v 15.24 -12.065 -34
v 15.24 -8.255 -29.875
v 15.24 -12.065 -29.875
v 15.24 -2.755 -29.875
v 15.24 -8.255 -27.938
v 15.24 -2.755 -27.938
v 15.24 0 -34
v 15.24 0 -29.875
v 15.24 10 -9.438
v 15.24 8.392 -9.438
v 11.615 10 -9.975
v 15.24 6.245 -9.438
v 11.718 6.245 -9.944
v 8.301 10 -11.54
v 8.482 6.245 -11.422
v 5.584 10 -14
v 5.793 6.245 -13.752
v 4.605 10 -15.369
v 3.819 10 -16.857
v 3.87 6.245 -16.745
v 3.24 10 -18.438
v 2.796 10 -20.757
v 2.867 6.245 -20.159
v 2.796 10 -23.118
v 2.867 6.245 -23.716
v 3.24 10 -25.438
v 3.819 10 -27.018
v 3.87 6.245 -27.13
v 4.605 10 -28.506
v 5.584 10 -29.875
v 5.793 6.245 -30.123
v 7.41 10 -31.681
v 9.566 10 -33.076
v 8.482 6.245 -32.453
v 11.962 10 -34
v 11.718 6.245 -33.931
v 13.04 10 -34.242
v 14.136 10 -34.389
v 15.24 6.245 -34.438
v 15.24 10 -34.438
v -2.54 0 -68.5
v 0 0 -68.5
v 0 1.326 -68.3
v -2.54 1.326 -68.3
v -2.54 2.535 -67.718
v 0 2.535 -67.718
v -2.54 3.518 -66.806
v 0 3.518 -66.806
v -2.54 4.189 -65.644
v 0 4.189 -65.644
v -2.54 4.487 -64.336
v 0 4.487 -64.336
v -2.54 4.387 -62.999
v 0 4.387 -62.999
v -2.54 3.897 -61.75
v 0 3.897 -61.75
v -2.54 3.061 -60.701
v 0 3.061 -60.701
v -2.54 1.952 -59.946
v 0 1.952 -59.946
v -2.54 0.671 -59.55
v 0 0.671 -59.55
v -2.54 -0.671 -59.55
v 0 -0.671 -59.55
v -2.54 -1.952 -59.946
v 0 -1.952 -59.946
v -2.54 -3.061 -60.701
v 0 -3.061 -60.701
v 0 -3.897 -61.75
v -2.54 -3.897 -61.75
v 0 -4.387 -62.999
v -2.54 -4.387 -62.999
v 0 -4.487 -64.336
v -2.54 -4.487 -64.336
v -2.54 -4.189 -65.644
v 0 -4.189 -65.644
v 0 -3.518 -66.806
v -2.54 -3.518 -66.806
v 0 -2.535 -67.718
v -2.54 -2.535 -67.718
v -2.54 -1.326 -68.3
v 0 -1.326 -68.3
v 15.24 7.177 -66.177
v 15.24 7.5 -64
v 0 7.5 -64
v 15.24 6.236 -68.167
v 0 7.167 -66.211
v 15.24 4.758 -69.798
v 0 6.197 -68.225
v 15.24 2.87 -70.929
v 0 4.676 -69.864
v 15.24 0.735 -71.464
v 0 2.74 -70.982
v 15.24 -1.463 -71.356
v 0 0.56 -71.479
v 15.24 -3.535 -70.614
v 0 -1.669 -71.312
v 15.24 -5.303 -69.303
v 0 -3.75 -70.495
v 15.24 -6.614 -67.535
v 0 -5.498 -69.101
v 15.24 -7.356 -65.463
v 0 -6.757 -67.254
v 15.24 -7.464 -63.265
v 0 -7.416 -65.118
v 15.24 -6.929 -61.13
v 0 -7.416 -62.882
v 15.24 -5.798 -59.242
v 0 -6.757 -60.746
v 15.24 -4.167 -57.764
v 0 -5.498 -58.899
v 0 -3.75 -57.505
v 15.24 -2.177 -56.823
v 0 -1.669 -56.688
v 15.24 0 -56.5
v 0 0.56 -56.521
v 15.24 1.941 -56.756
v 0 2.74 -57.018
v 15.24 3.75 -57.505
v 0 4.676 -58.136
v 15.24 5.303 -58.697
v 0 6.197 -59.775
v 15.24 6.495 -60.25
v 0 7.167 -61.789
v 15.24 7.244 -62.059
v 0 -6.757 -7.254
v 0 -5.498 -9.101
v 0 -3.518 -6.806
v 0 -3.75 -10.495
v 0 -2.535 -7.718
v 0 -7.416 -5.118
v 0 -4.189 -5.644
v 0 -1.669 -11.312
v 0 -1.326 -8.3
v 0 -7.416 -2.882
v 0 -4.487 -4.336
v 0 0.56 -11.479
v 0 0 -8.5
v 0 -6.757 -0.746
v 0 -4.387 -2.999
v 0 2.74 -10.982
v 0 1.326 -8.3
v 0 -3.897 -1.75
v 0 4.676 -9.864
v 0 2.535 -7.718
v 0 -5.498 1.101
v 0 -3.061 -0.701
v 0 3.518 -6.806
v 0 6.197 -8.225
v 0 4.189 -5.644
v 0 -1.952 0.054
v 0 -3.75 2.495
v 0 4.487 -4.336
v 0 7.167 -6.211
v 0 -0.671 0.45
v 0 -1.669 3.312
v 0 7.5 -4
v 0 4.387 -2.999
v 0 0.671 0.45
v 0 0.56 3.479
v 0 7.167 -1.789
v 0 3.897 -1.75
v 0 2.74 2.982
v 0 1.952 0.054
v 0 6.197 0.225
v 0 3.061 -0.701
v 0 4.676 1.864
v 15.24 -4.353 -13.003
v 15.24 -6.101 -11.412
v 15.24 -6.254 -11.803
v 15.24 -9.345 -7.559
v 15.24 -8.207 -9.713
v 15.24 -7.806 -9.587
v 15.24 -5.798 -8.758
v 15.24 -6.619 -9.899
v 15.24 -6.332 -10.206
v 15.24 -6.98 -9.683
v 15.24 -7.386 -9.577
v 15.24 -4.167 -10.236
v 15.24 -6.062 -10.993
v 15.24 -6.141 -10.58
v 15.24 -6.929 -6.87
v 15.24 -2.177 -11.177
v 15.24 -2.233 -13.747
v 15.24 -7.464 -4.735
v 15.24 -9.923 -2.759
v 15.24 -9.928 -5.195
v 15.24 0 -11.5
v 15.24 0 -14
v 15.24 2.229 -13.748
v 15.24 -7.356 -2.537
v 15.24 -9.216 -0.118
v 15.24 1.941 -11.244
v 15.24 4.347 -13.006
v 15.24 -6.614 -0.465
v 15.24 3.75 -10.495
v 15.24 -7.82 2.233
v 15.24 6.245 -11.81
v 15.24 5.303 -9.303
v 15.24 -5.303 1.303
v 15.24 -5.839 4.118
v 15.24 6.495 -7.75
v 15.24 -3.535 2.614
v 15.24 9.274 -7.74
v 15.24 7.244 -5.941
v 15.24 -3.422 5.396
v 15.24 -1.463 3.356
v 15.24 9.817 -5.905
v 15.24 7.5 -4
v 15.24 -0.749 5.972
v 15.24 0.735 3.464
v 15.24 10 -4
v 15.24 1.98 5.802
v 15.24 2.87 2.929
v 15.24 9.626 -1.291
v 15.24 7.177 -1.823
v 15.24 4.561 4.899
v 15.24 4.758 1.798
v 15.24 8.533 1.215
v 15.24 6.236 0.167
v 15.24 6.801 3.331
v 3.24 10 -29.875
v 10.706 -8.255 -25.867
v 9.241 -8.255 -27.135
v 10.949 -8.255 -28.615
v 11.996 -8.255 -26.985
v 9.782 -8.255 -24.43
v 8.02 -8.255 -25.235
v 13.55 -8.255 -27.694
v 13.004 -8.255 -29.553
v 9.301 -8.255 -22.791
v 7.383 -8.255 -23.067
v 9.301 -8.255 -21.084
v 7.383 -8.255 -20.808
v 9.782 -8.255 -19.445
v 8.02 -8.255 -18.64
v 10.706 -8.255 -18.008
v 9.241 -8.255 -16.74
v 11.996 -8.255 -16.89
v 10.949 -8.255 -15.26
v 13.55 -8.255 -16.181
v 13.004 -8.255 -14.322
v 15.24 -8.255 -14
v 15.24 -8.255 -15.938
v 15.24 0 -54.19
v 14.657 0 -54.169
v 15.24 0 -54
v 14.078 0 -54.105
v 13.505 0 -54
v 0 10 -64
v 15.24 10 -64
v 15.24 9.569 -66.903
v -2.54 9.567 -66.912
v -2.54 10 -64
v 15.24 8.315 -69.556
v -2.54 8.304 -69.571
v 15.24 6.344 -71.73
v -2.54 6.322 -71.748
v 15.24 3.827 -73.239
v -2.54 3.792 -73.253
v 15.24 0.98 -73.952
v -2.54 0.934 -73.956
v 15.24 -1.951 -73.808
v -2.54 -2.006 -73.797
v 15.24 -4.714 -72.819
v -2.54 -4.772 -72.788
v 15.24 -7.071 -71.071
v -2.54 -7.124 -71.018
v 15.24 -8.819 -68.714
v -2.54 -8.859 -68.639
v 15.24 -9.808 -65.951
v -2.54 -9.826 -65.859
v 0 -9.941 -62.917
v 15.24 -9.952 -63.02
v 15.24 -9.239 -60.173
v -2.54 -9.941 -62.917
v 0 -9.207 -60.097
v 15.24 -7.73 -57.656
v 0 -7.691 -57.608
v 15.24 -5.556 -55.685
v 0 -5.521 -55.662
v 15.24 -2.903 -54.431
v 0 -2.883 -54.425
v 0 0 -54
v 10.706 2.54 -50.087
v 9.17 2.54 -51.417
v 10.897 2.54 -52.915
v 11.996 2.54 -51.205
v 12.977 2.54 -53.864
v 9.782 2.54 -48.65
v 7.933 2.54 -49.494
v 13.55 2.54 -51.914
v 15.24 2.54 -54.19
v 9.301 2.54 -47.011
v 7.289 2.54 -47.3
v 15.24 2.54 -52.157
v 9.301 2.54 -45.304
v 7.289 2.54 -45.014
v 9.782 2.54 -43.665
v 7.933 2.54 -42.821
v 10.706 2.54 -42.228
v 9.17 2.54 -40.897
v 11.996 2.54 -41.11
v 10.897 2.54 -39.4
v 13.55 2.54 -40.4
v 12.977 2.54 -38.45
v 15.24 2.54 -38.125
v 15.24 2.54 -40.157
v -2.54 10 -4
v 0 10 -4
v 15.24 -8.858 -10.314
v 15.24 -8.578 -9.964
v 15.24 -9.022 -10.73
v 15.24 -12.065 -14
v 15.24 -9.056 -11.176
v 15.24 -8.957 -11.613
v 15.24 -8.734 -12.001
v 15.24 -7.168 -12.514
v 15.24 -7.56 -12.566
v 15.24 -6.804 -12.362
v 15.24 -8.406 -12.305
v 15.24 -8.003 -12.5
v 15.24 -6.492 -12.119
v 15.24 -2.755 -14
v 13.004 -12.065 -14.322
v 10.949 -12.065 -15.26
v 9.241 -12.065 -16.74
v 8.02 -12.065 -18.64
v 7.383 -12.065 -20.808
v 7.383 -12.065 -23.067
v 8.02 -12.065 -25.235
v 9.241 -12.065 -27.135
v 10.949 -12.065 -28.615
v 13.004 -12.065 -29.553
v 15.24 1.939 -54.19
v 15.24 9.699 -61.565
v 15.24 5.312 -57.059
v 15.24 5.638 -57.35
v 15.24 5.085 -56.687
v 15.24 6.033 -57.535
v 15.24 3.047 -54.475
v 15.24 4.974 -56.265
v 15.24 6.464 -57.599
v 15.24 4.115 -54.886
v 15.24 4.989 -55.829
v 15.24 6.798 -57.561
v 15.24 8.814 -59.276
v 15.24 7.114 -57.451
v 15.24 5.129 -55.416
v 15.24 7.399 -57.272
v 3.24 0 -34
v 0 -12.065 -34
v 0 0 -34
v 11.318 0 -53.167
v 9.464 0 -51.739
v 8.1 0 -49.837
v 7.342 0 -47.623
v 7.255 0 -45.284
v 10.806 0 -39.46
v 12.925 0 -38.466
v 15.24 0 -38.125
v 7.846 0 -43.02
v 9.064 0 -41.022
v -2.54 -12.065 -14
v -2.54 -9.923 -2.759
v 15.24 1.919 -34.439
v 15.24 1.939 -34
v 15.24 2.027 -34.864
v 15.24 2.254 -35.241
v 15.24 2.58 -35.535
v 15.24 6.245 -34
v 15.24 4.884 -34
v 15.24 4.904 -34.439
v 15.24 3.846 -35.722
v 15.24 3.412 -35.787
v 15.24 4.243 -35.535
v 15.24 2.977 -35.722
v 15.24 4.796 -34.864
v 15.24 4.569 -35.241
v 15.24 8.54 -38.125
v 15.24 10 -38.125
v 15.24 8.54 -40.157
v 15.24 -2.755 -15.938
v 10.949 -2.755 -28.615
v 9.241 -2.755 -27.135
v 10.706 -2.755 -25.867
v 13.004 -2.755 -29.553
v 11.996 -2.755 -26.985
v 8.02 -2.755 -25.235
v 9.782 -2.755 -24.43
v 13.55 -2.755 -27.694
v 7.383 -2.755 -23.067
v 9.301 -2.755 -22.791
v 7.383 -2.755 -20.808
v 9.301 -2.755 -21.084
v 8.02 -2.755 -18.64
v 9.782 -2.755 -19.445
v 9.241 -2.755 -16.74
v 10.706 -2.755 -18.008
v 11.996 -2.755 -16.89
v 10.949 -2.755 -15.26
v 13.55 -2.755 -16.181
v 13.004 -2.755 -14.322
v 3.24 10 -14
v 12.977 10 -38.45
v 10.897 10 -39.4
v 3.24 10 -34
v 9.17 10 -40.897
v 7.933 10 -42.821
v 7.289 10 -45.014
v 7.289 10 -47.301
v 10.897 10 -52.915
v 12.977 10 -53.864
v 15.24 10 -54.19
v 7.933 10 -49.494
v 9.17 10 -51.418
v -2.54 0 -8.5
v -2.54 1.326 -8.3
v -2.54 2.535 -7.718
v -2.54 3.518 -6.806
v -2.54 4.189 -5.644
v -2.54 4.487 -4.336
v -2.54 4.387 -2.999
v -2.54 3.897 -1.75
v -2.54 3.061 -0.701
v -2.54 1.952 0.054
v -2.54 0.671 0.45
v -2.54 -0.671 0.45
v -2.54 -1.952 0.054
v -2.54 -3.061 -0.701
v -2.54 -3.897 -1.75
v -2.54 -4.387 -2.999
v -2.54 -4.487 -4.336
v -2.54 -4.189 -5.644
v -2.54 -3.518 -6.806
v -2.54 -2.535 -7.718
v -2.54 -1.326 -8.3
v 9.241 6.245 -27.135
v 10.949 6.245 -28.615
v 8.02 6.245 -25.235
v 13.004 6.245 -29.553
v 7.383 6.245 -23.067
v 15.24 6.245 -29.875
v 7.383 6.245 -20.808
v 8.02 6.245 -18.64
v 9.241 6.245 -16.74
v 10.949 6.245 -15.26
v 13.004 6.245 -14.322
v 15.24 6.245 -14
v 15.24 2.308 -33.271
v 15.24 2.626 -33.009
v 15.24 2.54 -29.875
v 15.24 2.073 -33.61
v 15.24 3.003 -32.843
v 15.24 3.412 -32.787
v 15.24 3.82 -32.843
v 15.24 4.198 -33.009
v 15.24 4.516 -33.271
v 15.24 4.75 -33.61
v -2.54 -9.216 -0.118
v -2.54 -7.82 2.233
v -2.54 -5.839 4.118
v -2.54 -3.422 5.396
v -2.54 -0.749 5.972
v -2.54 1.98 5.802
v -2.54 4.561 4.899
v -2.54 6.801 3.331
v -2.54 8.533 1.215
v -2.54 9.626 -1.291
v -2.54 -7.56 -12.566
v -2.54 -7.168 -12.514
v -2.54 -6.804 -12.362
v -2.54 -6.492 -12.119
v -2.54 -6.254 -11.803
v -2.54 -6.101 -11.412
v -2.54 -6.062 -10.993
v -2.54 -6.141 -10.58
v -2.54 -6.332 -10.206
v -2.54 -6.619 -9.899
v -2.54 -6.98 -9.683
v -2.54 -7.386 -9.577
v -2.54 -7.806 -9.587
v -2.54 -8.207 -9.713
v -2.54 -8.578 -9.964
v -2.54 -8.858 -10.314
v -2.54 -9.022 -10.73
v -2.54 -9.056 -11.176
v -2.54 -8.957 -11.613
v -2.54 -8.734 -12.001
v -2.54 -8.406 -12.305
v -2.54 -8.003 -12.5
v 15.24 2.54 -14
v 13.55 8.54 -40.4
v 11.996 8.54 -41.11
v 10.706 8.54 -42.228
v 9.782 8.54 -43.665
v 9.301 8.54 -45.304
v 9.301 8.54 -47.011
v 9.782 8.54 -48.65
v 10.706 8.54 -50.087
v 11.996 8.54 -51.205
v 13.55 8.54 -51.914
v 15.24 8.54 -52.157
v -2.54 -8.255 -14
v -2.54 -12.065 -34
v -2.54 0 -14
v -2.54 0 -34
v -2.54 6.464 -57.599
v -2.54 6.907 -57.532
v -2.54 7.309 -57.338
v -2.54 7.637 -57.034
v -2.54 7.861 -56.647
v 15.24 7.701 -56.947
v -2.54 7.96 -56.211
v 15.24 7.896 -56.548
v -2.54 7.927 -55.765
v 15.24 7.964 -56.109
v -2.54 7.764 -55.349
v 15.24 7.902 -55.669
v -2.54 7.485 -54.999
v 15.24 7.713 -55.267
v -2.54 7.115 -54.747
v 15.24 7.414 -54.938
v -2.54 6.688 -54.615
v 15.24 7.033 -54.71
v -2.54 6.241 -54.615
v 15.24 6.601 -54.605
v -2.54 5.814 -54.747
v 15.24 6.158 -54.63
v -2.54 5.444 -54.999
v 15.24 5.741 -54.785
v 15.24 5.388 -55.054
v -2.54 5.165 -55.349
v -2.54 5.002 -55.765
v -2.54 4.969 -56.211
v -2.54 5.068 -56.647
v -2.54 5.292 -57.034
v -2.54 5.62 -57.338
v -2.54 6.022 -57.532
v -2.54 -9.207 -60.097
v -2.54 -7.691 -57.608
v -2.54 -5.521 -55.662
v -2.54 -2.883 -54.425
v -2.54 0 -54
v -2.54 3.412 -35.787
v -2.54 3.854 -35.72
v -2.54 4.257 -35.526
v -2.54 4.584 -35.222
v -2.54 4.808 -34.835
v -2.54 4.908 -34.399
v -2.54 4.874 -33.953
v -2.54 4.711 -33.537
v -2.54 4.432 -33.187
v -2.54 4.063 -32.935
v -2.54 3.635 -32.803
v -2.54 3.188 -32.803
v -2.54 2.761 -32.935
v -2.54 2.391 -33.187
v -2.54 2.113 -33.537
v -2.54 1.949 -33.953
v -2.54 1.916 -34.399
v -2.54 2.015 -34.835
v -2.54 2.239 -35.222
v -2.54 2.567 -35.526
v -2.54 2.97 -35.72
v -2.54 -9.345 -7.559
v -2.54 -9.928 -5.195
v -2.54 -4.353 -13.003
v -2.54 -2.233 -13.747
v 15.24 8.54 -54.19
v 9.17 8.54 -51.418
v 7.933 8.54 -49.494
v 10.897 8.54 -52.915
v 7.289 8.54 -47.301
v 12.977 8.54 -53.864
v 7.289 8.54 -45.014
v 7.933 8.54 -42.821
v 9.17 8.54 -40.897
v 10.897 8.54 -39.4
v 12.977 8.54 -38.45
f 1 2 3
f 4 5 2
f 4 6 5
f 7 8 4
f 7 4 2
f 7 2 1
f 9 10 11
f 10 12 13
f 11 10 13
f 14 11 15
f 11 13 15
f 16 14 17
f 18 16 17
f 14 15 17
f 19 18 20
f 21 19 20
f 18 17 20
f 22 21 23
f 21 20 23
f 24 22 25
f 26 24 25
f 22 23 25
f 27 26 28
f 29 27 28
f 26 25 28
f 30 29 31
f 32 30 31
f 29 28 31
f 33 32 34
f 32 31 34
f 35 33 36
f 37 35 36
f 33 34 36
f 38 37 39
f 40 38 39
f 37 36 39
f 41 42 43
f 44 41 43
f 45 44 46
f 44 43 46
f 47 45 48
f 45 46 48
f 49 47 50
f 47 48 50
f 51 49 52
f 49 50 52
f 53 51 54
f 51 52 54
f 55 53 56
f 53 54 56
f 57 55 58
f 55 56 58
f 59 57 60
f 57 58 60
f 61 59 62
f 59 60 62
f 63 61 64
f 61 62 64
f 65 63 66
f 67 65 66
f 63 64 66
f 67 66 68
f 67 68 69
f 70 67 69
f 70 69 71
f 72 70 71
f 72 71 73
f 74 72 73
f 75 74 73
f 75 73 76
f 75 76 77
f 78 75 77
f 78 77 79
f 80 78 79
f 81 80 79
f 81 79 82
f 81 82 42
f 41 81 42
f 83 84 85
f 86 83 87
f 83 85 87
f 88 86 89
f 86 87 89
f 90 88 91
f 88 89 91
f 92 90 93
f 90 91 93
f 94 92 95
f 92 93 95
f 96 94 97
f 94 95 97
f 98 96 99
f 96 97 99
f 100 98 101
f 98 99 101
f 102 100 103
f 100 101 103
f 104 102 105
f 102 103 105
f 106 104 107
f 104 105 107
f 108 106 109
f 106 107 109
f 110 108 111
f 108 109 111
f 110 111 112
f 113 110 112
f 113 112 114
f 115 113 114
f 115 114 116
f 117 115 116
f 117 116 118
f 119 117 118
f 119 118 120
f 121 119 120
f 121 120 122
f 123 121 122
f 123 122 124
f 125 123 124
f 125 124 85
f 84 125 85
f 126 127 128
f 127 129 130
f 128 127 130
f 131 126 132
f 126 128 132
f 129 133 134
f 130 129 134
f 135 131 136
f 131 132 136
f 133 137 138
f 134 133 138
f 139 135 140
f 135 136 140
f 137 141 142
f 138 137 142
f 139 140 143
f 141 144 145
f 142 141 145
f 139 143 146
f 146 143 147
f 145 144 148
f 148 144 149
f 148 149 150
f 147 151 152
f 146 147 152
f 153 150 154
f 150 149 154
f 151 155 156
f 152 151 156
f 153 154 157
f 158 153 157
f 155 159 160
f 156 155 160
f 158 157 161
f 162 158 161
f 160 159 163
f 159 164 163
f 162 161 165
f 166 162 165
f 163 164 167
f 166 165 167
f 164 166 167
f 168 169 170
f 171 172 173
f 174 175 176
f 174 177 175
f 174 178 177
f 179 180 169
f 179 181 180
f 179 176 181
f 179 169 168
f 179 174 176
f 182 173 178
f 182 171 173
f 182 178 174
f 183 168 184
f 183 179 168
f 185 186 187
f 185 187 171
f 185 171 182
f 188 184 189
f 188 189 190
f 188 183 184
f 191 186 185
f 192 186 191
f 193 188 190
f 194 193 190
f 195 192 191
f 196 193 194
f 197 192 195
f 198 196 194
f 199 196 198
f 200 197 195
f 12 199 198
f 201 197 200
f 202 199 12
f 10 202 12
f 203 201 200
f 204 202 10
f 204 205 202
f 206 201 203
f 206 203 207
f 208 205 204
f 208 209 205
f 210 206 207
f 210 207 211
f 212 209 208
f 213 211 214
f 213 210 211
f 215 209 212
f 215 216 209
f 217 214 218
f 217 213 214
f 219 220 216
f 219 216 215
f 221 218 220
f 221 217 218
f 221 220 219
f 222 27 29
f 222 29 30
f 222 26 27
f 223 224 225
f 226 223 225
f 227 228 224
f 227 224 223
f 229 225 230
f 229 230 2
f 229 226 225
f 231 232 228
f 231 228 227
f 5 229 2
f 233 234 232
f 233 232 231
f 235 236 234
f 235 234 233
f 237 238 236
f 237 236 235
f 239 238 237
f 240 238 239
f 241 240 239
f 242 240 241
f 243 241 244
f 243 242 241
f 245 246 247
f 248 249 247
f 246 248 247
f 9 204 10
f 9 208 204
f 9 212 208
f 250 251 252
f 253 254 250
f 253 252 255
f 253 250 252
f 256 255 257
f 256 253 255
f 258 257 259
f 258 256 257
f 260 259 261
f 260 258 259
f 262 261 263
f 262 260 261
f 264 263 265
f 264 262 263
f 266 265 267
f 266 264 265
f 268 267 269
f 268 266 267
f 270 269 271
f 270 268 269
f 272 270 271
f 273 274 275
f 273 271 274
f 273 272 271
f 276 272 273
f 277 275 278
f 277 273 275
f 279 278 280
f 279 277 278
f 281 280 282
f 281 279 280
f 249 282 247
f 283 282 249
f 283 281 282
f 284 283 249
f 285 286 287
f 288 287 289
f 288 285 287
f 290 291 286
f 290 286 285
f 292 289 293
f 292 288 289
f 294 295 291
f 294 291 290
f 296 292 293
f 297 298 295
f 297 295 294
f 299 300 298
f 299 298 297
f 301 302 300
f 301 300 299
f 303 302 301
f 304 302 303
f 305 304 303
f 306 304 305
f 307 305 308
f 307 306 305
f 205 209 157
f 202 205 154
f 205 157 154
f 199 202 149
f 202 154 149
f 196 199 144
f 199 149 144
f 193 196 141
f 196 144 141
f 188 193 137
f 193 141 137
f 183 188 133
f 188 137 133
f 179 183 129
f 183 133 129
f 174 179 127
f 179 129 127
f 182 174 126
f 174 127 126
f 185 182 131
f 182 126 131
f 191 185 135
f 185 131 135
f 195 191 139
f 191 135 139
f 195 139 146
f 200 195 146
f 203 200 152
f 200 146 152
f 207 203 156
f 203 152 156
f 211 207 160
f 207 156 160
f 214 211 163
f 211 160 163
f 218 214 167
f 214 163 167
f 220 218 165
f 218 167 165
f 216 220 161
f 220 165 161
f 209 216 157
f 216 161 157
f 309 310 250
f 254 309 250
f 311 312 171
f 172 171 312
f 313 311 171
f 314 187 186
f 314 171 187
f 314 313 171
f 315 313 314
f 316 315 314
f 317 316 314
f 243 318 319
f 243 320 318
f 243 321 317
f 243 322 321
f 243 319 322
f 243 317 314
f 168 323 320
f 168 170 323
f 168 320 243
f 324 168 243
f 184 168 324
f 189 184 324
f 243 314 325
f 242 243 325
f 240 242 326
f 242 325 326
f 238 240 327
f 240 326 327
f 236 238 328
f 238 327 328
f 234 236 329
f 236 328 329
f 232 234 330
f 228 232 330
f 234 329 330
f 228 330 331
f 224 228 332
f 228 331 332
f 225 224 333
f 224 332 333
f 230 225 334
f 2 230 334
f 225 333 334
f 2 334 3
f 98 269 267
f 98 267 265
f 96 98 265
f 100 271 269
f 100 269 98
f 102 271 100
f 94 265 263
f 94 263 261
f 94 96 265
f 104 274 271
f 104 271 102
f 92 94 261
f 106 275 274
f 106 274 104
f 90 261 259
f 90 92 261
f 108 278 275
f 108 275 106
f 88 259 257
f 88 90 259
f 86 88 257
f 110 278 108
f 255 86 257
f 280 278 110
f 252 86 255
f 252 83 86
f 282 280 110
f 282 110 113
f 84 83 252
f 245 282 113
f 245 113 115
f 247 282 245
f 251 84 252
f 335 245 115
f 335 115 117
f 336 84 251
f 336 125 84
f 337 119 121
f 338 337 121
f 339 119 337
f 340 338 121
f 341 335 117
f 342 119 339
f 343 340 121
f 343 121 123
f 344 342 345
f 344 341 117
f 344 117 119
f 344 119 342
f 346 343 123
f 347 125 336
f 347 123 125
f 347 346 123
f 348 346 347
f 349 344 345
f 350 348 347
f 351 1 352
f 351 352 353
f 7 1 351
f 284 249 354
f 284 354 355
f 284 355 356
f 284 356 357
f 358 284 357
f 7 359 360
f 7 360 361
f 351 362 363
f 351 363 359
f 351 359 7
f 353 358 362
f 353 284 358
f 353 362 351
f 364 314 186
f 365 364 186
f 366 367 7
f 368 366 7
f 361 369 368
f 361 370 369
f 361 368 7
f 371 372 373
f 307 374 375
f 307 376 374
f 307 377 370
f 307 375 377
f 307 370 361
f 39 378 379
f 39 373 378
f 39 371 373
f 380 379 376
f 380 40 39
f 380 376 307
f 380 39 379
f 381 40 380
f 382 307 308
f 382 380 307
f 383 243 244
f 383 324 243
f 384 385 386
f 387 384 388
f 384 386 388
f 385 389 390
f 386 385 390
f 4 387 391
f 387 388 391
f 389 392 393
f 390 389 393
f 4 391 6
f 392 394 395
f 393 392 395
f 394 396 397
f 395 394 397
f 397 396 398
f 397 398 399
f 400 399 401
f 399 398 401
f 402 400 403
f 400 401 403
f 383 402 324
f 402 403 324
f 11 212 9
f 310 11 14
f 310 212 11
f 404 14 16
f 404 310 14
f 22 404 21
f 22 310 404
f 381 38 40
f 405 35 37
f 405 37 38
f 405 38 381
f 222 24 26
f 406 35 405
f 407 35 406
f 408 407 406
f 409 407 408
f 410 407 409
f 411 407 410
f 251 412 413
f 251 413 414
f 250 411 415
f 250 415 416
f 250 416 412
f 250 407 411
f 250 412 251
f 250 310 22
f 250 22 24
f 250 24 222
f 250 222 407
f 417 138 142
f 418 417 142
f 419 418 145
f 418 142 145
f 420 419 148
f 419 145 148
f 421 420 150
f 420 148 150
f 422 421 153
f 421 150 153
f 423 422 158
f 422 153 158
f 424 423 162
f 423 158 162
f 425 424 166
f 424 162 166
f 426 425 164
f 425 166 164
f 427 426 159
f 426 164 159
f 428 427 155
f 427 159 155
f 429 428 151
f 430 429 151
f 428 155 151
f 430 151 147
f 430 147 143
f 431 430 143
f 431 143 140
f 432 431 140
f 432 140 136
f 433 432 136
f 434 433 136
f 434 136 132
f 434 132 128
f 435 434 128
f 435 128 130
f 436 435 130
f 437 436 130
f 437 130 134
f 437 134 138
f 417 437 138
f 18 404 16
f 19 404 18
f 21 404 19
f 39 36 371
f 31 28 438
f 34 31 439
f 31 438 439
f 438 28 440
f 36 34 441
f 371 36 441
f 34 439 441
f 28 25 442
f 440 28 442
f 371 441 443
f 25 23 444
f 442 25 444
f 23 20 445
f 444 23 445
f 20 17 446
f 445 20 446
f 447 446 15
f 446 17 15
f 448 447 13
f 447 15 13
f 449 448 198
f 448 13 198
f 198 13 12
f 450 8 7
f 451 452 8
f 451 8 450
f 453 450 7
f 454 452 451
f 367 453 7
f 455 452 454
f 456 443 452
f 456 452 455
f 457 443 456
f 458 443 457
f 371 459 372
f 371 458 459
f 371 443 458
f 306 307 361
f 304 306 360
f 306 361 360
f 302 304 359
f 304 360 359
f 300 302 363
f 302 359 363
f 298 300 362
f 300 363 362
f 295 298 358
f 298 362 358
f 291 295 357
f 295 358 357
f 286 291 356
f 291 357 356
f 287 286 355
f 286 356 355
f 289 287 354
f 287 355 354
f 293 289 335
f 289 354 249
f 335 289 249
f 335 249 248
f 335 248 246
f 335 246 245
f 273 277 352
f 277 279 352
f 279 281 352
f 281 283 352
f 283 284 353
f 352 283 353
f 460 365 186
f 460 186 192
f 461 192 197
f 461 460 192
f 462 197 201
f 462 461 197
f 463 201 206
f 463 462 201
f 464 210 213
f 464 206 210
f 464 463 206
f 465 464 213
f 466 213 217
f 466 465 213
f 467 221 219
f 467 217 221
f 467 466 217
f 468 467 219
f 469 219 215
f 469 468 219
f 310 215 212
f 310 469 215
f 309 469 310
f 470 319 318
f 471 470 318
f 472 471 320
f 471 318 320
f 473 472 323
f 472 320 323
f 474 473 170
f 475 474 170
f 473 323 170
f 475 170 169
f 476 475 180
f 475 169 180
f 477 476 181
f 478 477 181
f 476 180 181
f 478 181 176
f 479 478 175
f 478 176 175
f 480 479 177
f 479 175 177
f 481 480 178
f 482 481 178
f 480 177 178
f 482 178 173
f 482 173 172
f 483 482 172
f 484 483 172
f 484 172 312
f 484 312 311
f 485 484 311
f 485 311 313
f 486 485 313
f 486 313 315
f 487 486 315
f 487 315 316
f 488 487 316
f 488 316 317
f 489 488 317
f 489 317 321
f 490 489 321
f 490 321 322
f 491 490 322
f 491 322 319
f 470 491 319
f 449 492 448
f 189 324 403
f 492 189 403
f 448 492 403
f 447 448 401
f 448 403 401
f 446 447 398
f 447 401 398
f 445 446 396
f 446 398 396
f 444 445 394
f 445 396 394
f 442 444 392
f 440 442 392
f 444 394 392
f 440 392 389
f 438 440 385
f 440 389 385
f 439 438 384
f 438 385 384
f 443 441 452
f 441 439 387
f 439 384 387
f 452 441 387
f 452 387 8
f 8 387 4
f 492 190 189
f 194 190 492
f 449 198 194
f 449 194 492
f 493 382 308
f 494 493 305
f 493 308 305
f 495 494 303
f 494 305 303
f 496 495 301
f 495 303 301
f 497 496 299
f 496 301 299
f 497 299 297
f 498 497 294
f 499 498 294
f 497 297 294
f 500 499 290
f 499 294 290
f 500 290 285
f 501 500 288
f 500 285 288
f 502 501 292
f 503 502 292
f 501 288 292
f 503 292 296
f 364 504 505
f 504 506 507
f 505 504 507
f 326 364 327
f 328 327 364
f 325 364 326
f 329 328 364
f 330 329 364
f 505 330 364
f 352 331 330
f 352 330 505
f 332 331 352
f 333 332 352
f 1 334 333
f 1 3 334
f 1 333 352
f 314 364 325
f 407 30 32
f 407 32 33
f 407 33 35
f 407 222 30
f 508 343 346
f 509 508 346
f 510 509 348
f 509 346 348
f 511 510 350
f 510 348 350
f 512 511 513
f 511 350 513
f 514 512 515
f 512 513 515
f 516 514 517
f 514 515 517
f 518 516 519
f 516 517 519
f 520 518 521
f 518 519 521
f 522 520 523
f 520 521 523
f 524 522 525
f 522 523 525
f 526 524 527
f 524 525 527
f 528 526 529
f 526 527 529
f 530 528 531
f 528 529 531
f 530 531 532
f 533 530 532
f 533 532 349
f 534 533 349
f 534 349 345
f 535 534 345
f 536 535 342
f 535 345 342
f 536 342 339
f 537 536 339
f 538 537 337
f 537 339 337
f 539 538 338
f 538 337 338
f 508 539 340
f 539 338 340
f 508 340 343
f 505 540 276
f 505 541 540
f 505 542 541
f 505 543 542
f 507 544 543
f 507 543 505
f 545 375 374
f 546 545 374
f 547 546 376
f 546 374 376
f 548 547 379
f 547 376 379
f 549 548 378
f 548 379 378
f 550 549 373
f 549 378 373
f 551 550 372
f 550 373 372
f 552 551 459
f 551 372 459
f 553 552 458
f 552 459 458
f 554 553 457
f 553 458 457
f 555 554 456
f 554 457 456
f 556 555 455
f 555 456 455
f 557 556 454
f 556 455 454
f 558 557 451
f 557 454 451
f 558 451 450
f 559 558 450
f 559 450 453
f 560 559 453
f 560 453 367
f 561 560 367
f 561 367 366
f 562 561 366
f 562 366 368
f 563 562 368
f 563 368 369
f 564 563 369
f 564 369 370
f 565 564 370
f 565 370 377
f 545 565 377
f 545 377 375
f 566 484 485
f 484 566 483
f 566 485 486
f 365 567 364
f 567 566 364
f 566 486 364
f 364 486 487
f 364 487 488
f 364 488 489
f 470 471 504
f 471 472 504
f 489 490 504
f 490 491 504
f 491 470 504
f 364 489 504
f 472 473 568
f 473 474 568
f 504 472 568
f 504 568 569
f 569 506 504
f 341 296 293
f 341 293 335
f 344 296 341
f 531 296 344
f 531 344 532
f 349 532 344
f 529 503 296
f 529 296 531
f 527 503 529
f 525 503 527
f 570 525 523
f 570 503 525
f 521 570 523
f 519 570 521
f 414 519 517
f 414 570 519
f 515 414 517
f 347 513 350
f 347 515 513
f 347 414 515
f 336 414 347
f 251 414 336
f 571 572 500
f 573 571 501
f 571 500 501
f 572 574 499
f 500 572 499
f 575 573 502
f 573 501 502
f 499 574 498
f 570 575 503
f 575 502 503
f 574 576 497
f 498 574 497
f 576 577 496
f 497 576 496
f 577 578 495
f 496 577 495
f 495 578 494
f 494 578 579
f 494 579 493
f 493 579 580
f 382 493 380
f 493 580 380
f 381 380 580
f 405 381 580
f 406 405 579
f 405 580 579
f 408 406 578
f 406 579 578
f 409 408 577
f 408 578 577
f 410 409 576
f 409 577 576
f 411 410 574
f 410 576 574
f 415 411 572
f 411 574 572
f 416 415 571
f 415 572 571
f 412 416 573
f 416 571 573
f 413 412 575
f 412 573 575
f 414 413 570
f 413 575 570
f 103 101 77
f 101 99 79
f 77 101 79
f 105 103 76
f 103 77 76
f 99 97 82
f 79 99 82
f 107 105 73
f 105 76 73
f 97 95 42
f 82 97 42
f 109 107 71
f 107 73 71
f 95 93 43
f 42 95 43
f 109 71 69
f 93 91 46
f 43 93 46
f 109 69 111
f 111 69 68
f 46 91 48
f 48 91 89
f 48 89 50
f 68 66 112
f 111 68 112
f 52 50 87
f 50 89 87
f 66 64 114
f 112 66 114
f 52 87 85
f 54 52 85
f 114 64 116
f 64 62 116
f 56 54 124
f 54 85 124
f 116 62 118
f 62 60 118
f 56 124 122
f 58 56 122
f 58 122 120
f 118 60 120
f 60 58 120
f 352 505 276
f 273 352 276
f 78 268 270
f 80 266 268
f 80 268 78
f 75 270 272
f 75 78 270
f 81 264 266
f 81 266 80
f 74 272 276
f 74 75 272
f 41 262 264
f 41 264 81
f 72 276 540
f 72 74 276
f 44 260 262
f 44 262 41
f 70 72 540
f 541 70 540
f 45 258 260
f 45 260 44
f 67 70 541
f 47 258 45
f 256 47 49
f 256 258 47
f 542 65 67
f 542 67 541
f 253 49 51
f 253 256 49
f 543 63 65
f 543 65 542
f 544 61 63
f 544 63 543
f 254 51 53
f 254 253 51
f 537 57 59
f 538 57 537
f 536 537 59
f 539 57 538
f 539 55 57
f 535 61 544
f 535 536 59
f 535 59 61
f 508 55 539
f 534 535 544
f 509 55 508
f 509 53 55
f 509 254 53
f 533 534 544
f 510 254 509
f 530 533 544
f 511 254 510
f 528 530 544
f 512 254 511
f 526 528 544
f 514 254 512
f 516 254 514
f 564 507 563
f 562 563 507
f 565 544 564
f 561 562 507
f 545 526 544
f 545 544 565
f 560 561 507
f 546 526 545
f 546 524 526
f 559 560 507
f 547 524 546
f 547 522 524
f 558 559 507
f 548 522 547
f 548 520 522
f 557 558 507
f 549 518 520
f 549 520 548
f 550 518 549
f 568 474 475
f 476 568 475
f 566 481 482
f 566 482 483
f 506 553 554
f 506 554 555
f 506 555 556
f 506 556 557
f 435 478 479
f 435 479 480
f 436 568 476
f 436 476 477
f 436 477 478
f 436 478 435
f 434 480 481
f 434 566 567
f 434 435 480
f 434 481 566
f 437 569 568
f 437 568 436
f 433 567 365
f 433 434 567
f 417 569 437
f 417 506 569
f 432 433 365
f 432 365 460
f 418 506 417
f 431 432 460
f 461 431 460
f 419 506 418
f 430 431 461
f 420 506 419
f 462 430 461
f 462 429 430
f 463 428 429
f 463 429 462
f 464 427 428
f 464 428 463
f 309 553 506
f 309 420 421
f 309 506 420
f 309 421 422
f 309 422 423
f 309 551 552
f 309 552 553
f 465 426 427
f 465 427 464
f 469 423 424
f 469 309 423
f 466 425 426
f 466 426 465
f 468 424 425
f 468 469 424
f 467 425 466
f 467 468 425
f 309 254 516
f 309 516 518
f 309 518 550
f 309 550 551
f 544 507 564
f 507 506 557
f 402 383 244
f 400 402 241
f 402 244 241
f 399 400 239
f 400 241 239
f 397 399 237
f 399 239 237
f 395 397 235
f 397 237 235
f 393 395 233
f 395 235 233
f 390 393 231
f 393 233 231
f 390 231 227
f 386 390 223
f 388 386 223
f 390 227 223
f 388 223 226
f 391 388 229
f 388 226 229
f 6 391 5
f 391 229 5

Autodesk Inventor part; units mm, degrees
ref_plane "YZ Plane" through (0, 0, 0) normal (1, 0, 0) x (0, 1, 0)
ref_plane "XZ Plane" through (0, 0, 0) normal (0, 1, 0) x (-1, 0, 0)
ref_plane "XY Plane" through (0, 0, 0) normal (0, 0, 1) x (1, 0, 0)
sketch "Sketch1" plane through (0, 0, 0) normal (1, 0, 0) x (0, 1, 0)
  line L0 (0, 0) -> (0, -68)
  line L1 (0, -68) -> (0, -60)
  line L2 (0, 0) -> (0, -8)
  circle A0 centre (0, -4) radius 4
  circle A1 centre (0, -64) radius 4
  circle A2 centre (0, -64) radius 7.5
  circle A3 centre (0, -4) radius 7.5
  circle A4 centre (0, -4) radius 10
  circle A5 centre (0, -64) radius 10
  line L3 (10, -4) -> (10, -64)
  dimension "d5" = 20
  dimension "d6" = 20
  dimension "d0" = 68
  dimension "d1" = 8
  dimension "d2" = 8
  dimension "d3" = 15
  dimension "d4" = 15
extrude "Extrusion1" add sketch "Sketch1" along normal blind 15.24 contours A4 | A5
sketch "Sketch2" plane through (0, 0, -4) normal (-1, 0, 0) x (0, 0, 1)
  circle A0 centre (0, 0) radius 10 projected
  line L0 (0, 10) -> (-60, 10)
  circle A1 centre (-60, 0) radius 10 projected
  line L1 (-50, 0) -> (-10, 0)
  point P0 (4, 0)
extrude "Extrusion2" add sketch "Sketch2" along normal blind 2.54
sketch "Sketch3" plane through (0, 0, -4) normal (1, 0, 0) x (0, 0, -1)
  line L0 (0, 10) -> (60, 10) projected
  arc A0 (10, 0) -> (0, 10) centre (0, 0) ccw projected
  line L1 (50, 0) -> (10, 0) projected
  arc A1 (60, 10) -> (50, 0) centre (60, 0) ccw projected
  line L2 (0, 10) -> (60, 10) projected
  point P0 (-4, 0)
extrude "Extrusion3" add sketch "Sketch3" along normal up to surface (15.24 mm away)
sketch "Sketch4" plane through (-2.54, 0, -14) normal (0, -1, 0) x (1, 0, 0)
  line L0 (0, 0) -> (17.78, 0) projected
  line L1 (17.78, 0) -> (17.78, -15.875)
  line L2 (17.78, -40) -> (0, -40) projected
  line L3 (17.78, -40) -> (17.78, 0) projected
  arc A0 (17.78, -24.125) -> (17.78, -40.1897) centre (17.78, -32.1574) ccw
  line L4 (17.78, 0) -> (17.78, -15.875)
  arc A1 (17.78, 0) -> (17.78, -15.875) centre (17.78, -7.9375) ccw
  line L5 (17.78, -24.125) -> (17.78, -40.1897)
  point P0 (2.54, 14)
  dimension "d13" = 15.875
  dimension "d16" = 15.875
extrude "Extrusion4" cut sketch "Sketch4" against normal blind 2.54
sketch "Sketch5" plane through (-2.54, 2.54, -14) normal (0, -1, 0) x (1, 0, 0)
  line L0 (17.78, 0) -> (17.78, 20) projected
  line L1 (17.78, -24.125) -> (17.78, -15.875) projected
  arc A0 (17.78, 0) -> (17.78, -15.875) centre (17.78, -7.9375) ccw projected
  line L2 (0, 0) -> (17.78, 0) projected
  line L3 (0, -40) -> (0, 0) projected
  line L4 (16.0445, -40) -> (0, -40) projected
  arc A1 (17.78, -24.125) -> (16.0445, -40) centre (17.78, -32.1574) ccw projected
  line L5 (17.78, -24.125) -> (17.78, -15.875) projected
  line L6 (17.78, 0) -> (17.78, -15.875)
  line L7 (17.78, 10) -> (17.78, -50) projected
  line L8 (17.78, -60) -> (17.78, -40) projected
  line L9 (17.78, -24.125) -> (17.78, -40)
  circle A2 centre (17.78, -7.9375) radius 6
  circle A3 centre (17.78, -32.1574) radius 6
  point P0 (2.54, 14)
  dimension "d20" = 12
  dimension "d21" = 12
extrude "Extrusion5" cut sketch "Sketch5" against normal blind 6 contours A3 L7 | L7 A3 | A2 L6 | L6 A2
sketch "Sketch6" plane through (-2.54, 8.54, -14) normal (0, -1, 0) x (1, 0, 0)
  line L0 (17.78, -26.1574) -> (17.78, -38.1574) projected
  circle A0 centre (17.78, -32.1574) radius 8.0324
  line L1 (17.78, -1.9375) -> (17.78, -13.9375) projected
  arc A1 (17.78, -1.9375) -> (17.78, -13.9375) centre (17.78, -7.9375) ccw projected
  circle A2 centre (17.78, -7.9375) radius 7.9375
  point P0 (2.54, 14)
extrude "Extrusion6" cut sketch "Sketch6" against normal blind 6 contours A0 | L1 A1 | A2
sketch "Sketch7" plane through (15.24, 0, 0) normal (1, 0, 0) x (0, 0, -1)
  line L0 (29.875, 10) -> (38.125, 10) projected
  arc A0 (4, 10) -> (14, 0) centre (4, 0) ccw projected
  line L1 (34, 10) -> (14, 10)
  line L2 (14, 10) -> (14, 0)
  line L3 (14, 0) -> (34, 0)
  line L4 (34, 0) -> (34, 10)
  point P0 (0, 0)
extrude "Extrusion7" add sketch "Sketch7" against normal blind 12
sketch "Sketch8" plane through (15.24, 0, 0) normal (1, 0, 0) x (0, 0, -1)
  line L0 (54, 0) -> (14, 0) projected
  line L1 (34, 0) -> (14, 0)
  line L2 (14, 0) -> (14, -12.065)
  line L3 (14, -12.065) -> (34, -12.065)
  line L4 (34, -12.065) -> (34, 0)
  point P0 (0, 0)
  dimension "d28" = 12.065
extrude "Extrusion8" add sketch "Sketch8" against normal up to surface (17.78 mm away)
sketch "Sketch9" plane through (15.24, -12.065, -34) normal (0, -1, 0) x (1, 0, 0)
  line L0 (-17.78, 20) -> (0, 20) projected
  line L1 (0, 20) -> (0, 4.125)
  line L2 (0, 20) -> (0, 0) projected
  arc A0 (0, 20) -> (0, 4.125) centre (0, 12.0625) ccw
  point P0 (-15.24, 34)
  dimension "d31" = 15.875
  dimension "d32" = 7.9375
extrude "Extrusion9" cut sketch "Sketch9" against normal blind 3.81
sketch "Sketch10" plane through (15.24, -8.255, -34) normal (0, -1, 0) x (1, 0, 0)
  line L0 (0, 20) -> (0, 4.125) projected
  arc A0 (0, 20) -> (0, 4.125) centre (0, 12.0625) ccw projected
  circle A1 centre (0, 12.0625) radius 6
  point P0 (-15.24, 34)
  dimension "d35" = 12
extrude "Extrusion10" cut sketch "Sketch10" against normal blind 5.5 contours A1 L0 | L0 A1
sketch "Sketch11" plane through (15.24, -2.755, -34) normal (0, -1, 0) x (1, 0, 0)
  line L0 (0, 18.0625) -> (0, 6.0625) projected
  circle A0 centre (0, 12.0625) radius 7.9375
  point P0 (-15.24, 34)
extrude "Extrusion11" cut sketch "Sketch11" against normal blind 9
sketch "Sketch12" plane through (15.24, 6.245, -34) normal (0, -1, 0) x (1, 0, 0)
  line L0 (0, 20) -> (0, 4.125) projected
  circle A0 centre (0, 12.0625) radius 12.5
  point P0 (-15.24, 34)
  dimension "d40" = 25
extrude "Extrusion12" cut sketch "Sketch12" against normal blind 9
sketch "Sketch13" plane through (15.24, 0, 0) normal (1, 0, 0) x (0, 0, -1)
  line L0 (9.4375, 6.245) -> (9.4375, 10) projected
  line L1 (4, 10) -> (9.4375, 10) projected
  arc A0 (4, 10) -> (14, 0) centre (4, 0) ccw projected
  line L2 (14, 0) -> (14, 6.245) projected
  line L3 (14, 6.245) -> (9.4375, 6.245) projected
  circle A1 centre (4, 0) radius 7.5 projected
  line L4 (14, -8.255) -> (14, -12.065) projected
  line L5 (14, -12.065) -> (2.7589, -9.9227)
  arc A2 (4, 10) -> (14, 0) centre (4, 0) ccw projected
  line L6 (14, 0) -> (14, -12.065)
  line L7 (14, -12.065) -> (14, 0) projected
  line L8 (14, -12.065) -> (14, 0)
  line L9 (14, 0) -> (8.3795, -7.0711)
  line L10 (8.3795, -7.0711) -> (2.7589, -9.9227)
  point P0 (0, 0)
extrude "Extrusion13" add sketch "Sketch13" against normal up to surface (17.78 mm away) contours L6 L4 L5 A0
sketch "Sketch14" plane through (-2.54, 0, -4) normal (-1, 0, 0) x (0, 0, 1)
  line L0 (-30, -12.065) -> (-10, -12.065) projected
  arc A0 (1.2411, -9.9227) -> (0, 10) centre (0, 0) ccw projected
  arc A1 (1.2411, -9.9227) -> (0, 10) centre (0, 0) ccw projected
  line L1 (0, 10) -> (-60, 10) projected
  arc A2 (-60, 10) -> (-50, 0) centre (-60, 0) ccw projected
  line L2 (-50, 0) -> (-30, 0) projected
  line L3 (-30, 0) -> (-30, -12.065) projected
  line L4 (-30, -12.065) -> (-10, -12.065) projected
  line L5 (-10, -12.065) -> (1.2411, -9.9227) projected
  line L6 (-30, -12.065) -> (-58.9174, -9.9412)
  arc A3 (-60, 10) -> (-50, 0) centre (-60, 0) ccw projected
  point P0 (4, 0)
extrude "Extrusion14" add sketch "Sketch14" against normal blind 2.54 contours L6 A2 L2 L3
sketch "Sketch15" plane through (0, 0, -4) normal (1, 0, 0) x (0, 0, -1)
  circle A0 centre (0, 0) radius 4.5
  circle A1 centre (60, 0) radius 7.5 projected
  circle A2 centre (60, 0) radius 4.5
  point P0 (-4, 0)
  dimension "d47" = 9
  dimension "d48" = 9
extrude "Extrusion15" cut sketch "Sketch15" against normal blind 2.54 contours A0 | A2
sketch "Sketch16" plane through (15.24, 0, 0) normal (1, 0, 0) x (0, 0, -1)
  circle A0 centre (34.2867, 3.4117) radius 1.5
  point P0 (0, 0)
  dimension "d51" = 3
extrude "Extrusion16" cut sketch "Sketch16" against normal blind 70.8025
sketch "Sketch17" plane through (15.24, 0, 0) normal (1, 0, 0) x (0, 0, -1)
  circle A0 centre (56.0987, 6.4645) radius 1.5
  circle A1 centre (11.0664, -7.5602) radius 1.5
  point P0 (0, 0)
  dimension "d54" = 3
  dimension "d55" = 3
extrude "Extrusion17" cut sketch "Sketch17" against normal blind 70.8025
properties part number "Hotend holder V4"
